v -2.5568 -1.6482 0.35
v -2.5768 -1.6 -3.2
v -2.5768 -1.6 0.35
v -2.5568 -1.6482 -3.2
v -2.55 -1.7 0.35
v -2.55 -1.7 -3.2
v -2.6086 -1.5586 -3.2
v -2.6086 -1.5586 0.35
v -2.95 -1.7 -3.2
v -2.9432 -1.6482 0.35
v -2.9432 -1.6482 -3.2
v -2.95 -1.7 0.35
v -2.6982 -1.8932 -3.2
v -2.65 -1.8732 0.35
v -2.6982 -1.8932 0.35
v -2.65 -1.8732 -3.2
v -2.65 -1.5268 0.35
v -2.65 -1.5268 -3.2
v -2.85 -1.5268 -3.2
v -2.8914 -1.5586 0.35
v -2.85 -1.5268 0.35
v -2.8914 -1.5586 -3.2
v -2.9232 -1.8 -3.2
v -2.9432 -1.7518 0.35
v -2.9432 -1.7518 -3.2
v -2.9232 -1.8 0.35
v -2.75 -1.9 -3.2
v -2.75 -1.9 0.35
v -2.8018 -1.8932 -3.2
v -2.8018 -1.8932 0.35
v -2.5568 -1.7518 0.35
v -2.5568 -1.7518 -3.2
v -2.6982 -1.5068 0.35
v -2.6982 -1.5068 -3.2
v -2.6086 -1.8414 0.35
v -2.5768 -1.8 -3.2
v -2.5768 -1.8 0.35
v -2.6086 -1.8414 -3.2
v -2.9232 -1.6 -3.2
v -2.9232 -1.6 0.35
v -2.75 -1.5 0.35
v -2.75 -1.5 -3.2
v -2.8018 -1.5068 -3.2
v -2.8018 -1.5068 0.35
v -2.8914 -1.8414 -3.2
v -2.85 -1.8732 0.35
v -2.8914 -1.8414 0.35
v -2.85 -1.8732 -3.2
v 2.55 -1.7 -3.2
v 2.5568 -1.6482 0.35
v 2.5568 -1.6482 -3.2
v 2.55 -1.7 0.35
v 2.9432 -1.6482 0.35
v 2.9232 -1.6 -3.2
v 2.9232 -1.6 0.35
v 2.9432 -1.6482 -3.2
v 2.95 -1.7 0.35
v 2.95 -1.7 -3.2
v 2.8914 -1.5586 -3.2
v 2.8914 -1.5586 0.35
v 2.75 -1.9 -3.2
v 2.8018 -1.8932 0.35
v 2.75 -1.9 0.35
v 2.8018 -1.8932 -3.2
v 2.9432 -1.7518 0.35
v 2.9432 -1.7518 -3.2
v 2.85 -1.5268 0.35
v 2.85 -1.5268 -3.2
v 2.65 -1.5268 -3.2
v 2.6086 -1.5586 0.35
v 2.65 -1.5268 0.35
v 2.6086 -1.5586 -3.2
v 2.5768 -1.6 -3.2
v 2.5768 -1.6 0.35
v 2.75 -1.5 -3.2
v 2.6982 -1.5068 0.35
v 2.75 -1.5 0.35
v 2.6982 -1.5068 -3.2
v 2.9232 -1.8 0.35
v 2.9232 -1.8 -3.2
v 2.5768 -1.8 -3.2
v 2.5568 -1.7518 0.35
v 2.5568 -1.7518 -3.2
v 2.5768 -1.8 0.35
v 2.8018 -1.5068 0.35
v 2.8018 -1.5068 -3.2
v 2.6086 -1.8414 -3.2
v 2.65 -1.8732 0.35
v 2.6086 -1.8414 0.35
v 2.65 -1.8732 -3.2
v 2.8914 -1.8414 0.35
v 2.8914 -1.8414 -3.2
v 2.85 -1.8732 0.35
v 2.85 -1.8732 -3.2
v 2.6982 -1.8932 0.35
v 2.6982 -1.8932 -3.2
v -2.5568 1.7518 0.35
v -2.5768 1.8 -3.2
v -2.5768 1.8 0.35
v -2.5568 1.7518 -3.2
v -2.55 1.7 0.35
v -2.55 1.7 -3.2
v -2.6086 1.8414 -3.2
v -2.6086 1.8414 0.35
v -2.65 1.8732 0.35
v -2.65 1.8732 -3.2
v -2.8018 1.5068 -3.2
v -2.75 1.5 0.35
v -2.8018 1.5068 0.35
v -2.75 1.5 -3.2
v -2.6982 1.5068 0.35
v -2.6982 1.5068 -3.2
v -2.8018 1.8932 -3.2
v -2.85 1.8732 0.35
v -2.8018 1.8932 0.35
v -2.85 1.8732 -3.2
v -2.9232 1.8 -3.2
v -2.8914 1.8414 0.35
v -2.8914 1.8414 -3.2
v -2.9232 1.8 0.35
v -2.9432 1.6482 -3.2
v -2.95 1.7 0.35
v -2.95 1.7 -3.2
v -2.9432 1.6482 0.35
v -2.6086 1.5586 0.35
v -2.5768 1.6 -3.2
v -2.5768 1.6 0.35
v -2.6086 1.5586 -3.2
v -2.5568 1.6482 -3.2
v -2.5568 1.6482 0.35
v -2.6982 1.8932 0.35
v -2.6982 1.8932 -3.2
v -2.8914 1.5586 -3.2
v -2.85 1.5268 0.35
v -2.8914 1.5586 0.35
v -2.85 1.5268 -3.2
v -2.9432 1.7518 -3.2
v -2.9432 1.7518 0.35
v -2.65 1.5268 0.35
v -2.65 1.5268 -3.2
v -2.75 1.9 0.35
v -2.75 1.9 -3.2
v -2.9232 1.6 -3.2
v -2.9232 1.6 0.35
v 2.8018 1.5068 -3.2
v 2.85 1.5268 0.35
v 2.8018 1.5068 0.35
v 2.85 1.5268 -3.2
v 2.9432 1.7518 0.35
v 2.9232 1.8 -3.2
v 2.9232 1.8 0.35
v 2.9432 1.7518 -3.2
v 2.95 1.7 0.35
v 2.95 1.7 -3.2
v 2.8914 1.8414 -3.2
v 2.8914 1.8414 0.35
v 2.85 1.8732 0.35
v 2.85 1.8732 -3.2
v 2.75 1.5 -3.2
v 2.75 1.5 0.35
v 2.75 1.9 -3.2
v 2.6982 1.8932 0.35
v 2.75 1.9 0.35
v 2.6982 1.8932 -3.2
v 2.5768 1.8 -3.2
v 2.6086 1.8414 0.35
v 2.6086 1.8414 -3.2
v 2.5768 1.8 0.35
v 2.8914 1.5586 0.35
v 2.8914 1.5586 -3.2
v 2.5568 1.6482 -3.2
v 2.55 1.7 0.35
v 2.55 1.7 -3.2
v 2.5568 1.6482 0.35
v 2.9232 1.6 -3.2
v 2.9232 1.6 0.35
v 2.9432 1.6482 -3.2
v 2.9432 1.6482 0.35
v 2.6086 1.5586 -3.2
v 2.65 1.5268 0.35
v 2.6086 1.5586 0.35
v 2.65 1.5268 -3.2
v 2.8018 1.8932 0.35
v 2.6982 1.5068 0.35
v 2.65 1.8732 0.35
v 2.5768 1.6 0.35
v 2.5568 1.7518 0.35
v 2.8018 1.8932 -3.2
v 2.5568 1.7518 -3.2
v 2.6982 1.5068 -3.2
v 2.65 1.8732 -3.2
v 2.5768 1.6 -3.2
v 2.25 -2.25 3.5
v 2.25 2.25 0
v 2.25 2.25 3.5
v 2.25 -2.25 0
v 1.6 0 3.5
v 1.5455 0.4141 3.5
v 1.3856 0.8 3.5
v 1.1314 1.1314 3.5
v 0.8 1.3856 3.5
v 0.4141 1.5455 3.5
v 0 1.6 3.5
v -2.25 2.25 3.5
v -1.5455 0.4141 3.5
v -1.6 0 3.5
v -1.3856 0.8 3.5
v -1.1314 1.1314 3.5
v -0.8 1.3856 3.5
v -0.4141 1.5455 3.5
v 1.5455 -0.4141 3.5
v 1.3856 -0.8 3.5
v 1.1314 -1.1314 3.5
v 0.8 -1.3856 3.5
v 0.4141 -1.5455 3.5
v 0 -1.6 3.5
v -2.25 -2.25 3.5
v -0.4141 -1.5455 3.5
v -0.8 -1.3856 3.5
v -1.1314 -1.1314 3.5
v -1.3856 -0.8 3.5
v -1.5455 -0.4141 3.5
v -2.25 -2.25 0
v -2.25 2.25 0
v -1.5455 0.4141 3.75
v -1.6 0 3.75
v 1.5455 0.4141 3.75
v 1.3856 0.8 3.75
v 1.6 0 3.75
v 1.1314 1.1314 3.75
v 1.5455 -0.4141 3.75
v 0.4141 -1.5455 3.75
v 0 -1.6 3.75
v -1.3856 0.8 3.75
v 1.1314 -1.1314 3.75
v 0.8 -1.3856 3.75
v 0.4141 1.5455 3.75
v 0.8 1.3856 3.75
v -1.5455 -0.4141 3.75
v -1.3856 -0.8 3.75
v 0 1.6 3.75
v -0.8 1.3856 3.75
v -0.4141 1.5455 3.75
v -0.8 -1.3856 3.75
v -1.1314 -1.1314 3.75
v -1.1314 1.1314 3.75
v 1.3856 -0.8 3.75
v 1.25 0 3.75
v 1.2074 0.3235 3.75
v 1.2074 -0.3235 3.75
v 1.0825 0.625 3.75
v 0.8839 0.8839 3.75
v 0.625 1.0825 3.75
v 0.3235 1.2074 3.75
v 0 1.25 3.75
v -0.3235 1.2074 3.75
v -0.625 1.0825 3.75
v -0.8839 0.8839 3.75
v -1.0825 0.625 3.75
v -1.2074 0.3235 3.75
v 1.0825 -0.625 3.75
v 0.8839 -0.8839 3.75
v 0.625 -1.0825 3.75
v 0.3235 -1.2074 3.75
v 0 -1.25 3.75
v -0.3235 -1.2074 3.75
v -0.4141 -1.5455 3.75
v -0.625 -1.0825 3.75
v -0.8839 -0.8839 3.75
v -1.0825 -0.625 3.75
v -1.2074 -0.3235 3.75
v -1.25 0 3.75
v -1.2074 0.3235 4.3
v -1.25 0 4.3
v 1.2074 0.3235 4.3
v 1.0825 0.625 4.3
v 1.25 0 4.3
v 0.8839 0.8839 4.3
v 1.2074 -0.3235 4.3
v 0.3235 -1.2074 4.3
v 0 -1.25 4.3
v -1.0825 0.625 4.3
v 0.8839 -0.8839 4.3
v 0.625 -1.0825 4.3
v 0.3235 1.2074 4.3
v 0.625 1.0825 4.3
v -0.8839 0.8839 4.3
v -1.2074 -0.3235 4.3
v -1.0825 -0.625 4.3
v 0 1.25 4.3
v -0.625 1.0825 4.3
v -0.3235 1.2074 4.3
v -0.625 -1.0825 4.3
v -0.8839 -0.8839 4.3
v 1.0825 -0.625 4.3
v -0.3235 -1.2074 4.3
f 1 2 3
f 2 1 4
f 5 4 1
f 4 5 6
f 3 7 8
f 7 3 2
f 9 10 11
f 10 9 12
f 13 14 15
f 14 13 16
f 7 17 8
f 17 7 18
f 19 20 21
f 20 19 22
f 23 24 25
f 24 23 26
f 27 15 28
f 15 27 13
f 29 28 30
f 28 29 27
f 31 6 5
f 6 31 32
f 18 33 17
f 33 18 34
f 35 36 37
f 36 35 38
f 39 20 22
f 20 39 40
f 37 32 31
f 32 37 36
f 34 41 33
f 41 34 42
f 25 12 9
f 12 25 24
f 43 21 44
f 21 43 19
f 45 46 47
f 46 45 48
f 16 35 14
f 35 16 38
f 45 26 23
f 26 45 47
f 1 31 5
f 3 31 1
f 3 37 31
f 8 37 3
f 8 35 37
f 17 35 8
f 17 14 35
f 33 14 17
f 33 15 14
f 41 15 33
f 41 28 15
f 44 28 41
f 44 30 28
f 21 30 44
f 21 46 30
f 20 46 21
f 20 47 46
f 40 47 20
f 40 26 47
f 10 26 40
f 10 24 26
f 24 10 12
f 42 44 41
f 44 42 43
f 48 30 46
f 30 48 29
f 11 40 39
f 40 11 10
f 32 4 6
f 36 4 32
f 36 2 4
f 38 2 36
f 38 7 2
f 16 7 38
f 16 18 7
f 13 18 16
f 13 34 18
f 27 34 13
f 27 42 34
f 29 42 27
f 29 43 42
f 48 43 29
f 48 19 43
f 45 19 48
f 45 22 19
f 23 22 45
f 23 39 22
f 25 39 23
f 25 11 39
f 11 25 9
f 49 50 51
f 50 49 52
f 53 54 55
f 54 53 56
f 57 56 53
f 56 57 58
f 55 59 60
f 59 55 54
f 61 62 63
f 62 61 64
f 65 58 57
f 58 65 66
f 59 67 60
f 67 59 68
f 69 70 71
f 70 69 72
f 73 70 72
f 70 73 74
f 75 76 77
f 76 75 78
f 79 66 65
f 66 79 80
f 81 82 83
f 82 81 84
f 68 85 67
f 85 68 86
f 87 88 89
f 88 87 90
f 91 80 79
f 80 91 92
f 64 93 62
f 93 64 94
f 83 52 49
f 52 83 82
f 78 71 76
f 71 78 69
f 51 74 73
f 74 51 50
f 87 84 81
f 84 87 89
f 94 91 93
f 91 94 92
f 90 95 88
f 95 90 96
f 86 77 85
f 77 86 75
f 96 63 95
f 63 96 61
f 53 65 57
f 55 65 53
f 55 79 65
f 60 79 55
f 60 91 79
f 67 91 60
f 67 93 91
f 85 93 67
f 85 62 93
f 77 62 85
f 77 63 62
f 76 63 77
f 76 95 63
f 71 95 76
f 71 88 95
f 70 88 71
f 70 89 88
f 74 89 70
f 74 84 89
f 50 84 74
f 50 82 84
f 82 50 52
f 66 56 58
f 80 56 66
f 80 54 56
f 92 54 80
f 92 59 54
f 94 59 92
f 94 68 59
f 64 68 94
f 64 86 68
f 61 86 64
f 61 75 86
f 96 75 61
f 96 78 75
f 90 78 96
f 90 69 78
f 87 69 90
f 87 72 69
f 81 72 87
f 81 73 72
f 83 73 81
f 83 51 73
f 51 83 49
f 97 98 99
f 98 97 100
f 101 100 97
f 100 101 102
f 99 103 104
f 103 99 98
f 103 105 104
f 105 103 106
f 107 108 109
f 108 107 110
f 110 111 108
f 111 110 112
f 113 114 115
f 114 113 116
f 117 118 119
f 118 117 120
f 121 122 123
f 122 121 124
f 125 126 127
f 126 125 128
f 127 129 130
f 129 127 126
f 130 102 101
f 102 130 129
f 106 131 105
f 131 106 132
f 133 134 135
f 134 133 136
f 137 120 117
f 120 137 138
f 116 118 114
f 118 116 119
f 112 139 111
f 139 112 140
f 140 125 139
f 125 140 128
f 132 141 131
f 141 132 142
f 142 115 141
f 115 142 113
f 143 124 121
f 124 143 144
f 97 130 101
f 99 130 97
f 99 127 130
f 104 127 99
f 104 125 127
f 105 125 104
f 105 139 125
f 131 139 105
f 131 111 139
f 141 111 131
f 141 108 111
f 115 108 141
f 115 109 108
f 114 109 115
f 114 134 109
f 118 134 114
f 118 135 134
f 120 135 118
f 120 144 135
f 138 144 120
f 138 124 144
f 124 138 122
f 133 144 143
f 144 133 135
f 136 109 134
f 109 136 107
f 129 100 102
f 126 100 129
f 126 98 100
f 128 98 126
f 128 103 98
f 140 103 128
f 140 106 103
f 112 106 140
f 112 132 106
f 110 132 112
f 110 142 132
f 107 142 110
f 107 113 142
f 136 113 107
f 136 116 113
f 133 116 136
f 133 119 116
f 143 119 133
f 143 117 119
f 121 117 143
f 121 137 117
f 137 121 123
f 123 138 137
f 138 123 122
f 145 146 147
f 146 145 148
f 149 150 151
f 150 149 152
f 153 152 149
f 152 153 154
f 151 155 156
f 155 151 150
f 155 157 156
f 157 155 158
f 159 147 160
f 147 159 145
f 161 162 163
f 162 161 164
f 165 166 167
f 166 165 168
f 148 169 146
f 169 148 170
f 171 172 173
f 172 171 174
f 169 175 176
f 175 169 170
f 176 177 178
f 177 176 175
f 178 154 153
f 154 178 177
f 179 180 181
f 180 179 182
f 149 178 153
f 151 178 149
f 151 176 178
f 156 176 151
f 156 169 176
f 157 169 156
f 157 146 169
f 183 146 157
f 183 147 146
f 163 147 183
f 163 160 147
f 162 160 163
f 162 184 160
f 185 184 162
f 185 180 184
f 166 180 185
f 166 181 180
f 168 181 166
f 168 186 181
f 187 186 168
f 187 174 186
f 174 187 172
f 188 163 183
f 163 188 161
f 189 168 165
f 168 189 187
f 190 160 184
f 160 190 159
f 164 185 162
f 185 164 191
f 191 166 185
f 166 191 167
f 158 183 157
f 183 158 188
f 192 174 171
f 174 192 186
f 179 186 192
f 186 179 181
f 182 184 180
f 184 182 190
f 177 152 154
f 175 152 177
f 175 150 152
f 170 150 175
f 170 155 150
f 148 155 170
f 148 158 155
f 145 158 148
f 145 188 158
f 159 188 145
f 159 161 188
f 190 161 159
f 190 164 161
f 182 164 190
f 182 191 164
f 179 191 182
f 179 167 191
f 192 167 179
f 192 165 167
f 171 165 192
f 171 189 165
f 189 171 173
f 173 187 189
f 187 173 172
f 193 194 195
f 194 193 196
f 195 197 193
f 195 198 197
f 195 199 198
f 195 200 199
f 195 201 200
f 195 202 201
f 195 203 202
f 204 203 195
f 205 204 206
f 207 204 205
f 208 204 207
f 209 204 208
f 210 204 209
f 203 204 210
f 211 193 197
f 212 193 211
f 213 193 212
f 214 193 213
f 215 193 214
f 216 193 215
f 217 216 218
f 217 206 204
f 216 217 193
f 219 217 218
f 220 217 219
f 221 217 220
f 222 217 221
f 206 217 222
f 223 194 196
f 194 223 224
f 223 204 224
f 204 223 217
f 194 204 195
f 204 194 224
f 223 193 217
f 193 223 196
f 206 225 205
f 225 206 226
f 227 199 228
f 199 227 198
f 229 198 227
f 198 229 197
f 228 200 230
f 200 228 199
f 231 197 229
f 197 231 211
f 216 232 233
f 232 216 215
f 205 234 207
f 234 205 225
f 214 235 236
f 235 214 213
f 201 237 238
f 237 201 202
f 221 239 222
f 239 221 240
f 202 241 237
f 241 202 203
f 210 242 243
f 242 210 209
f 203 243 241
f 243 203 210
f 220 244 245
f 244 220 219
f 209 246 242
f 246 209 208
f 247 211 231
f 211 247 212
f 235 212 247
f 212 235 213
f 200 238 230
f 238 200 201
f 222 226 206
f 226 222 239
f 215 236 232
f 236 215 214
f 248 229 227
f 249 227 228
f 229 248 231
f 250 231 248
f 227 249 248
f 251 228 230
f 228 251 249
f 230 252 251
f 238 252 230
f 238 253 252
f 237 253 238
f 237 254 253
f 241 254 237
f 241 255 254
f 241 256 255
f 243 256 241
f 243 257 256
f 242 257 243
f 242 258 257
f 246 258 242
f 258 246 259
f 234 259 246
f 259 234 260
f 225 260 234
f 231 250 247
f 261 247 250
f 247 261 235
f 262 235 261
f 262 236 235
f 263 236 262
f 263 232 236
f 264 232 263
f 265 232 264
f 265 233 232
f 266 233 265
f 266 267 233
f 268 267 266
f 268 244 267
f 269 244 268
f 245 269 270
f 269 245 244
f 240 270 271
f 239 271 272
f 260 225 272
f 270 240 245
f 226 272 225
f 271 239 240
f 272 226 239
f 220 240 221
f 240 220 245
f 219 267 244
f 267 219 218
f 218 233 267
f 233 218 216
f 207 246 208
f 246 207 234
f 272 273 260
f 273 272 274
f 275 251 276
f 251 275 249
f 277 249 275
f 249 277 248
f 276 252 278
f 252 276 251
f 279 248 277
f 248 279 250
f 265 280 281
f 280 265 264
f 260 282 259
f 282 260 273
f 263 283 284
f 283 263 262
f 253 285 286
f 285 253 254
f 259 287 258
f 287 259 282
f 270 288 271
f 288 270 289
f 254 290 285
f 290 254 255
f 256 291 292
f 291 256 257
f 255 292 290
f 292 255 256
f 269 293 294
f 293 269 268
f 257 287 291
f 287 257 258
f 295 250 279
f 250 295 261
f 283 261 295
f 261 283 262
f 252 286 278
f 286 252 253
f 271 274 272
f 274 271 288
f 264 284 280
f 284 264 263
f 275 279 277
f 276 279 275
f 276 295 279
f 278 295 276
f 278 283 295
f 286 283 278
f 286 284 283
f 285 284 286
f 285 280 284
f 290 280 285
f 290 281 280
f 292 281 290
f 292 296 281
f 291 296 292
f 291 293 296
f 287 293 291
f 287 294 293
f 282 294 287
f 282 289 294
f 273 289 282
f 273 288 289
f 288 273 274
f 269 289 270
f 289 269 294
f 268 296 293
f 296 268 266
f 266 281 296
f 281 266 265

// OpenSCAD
// SW_SPST_4.5x4.5 THT — pins match pcb/lib/tactile_45/params.py
// Body 4.5×4.5; THT pins at (±2.75, ±1.7); NOT SMD PTS645
$fn = 24;

body = 4.5;
body_h = 3.5;
act_d = 2.5;
act_h = 0.8;
pin_d = 0.40;
pin_below = 3.2;
pin_above = 0.35;

module pin(x, y) {
  translate([x, y, (pin_above - pin_below) / 2])
    cylinder(h = pin_above + pin_below, d = pin_d, center = true);
}

color("dimgray")
  translate([0, 0, body_h / 2]) cube([body, body, body_h], center = true);

color("black")
  translate([0, 0, body_h]) cylinder(h = 0.25, d = act_d + 0.7);

color("black")
  translate([0, 0, body_h + act_h / 2])
    cylinder(h = act_h, d = act_d, center = true);

color("silver") {
  pin(-2.75, -1.70);
  pin( 2.75, -1.70);
  pin(-2.75,  1.70);
  pin( 2.75,  1.70);
}
